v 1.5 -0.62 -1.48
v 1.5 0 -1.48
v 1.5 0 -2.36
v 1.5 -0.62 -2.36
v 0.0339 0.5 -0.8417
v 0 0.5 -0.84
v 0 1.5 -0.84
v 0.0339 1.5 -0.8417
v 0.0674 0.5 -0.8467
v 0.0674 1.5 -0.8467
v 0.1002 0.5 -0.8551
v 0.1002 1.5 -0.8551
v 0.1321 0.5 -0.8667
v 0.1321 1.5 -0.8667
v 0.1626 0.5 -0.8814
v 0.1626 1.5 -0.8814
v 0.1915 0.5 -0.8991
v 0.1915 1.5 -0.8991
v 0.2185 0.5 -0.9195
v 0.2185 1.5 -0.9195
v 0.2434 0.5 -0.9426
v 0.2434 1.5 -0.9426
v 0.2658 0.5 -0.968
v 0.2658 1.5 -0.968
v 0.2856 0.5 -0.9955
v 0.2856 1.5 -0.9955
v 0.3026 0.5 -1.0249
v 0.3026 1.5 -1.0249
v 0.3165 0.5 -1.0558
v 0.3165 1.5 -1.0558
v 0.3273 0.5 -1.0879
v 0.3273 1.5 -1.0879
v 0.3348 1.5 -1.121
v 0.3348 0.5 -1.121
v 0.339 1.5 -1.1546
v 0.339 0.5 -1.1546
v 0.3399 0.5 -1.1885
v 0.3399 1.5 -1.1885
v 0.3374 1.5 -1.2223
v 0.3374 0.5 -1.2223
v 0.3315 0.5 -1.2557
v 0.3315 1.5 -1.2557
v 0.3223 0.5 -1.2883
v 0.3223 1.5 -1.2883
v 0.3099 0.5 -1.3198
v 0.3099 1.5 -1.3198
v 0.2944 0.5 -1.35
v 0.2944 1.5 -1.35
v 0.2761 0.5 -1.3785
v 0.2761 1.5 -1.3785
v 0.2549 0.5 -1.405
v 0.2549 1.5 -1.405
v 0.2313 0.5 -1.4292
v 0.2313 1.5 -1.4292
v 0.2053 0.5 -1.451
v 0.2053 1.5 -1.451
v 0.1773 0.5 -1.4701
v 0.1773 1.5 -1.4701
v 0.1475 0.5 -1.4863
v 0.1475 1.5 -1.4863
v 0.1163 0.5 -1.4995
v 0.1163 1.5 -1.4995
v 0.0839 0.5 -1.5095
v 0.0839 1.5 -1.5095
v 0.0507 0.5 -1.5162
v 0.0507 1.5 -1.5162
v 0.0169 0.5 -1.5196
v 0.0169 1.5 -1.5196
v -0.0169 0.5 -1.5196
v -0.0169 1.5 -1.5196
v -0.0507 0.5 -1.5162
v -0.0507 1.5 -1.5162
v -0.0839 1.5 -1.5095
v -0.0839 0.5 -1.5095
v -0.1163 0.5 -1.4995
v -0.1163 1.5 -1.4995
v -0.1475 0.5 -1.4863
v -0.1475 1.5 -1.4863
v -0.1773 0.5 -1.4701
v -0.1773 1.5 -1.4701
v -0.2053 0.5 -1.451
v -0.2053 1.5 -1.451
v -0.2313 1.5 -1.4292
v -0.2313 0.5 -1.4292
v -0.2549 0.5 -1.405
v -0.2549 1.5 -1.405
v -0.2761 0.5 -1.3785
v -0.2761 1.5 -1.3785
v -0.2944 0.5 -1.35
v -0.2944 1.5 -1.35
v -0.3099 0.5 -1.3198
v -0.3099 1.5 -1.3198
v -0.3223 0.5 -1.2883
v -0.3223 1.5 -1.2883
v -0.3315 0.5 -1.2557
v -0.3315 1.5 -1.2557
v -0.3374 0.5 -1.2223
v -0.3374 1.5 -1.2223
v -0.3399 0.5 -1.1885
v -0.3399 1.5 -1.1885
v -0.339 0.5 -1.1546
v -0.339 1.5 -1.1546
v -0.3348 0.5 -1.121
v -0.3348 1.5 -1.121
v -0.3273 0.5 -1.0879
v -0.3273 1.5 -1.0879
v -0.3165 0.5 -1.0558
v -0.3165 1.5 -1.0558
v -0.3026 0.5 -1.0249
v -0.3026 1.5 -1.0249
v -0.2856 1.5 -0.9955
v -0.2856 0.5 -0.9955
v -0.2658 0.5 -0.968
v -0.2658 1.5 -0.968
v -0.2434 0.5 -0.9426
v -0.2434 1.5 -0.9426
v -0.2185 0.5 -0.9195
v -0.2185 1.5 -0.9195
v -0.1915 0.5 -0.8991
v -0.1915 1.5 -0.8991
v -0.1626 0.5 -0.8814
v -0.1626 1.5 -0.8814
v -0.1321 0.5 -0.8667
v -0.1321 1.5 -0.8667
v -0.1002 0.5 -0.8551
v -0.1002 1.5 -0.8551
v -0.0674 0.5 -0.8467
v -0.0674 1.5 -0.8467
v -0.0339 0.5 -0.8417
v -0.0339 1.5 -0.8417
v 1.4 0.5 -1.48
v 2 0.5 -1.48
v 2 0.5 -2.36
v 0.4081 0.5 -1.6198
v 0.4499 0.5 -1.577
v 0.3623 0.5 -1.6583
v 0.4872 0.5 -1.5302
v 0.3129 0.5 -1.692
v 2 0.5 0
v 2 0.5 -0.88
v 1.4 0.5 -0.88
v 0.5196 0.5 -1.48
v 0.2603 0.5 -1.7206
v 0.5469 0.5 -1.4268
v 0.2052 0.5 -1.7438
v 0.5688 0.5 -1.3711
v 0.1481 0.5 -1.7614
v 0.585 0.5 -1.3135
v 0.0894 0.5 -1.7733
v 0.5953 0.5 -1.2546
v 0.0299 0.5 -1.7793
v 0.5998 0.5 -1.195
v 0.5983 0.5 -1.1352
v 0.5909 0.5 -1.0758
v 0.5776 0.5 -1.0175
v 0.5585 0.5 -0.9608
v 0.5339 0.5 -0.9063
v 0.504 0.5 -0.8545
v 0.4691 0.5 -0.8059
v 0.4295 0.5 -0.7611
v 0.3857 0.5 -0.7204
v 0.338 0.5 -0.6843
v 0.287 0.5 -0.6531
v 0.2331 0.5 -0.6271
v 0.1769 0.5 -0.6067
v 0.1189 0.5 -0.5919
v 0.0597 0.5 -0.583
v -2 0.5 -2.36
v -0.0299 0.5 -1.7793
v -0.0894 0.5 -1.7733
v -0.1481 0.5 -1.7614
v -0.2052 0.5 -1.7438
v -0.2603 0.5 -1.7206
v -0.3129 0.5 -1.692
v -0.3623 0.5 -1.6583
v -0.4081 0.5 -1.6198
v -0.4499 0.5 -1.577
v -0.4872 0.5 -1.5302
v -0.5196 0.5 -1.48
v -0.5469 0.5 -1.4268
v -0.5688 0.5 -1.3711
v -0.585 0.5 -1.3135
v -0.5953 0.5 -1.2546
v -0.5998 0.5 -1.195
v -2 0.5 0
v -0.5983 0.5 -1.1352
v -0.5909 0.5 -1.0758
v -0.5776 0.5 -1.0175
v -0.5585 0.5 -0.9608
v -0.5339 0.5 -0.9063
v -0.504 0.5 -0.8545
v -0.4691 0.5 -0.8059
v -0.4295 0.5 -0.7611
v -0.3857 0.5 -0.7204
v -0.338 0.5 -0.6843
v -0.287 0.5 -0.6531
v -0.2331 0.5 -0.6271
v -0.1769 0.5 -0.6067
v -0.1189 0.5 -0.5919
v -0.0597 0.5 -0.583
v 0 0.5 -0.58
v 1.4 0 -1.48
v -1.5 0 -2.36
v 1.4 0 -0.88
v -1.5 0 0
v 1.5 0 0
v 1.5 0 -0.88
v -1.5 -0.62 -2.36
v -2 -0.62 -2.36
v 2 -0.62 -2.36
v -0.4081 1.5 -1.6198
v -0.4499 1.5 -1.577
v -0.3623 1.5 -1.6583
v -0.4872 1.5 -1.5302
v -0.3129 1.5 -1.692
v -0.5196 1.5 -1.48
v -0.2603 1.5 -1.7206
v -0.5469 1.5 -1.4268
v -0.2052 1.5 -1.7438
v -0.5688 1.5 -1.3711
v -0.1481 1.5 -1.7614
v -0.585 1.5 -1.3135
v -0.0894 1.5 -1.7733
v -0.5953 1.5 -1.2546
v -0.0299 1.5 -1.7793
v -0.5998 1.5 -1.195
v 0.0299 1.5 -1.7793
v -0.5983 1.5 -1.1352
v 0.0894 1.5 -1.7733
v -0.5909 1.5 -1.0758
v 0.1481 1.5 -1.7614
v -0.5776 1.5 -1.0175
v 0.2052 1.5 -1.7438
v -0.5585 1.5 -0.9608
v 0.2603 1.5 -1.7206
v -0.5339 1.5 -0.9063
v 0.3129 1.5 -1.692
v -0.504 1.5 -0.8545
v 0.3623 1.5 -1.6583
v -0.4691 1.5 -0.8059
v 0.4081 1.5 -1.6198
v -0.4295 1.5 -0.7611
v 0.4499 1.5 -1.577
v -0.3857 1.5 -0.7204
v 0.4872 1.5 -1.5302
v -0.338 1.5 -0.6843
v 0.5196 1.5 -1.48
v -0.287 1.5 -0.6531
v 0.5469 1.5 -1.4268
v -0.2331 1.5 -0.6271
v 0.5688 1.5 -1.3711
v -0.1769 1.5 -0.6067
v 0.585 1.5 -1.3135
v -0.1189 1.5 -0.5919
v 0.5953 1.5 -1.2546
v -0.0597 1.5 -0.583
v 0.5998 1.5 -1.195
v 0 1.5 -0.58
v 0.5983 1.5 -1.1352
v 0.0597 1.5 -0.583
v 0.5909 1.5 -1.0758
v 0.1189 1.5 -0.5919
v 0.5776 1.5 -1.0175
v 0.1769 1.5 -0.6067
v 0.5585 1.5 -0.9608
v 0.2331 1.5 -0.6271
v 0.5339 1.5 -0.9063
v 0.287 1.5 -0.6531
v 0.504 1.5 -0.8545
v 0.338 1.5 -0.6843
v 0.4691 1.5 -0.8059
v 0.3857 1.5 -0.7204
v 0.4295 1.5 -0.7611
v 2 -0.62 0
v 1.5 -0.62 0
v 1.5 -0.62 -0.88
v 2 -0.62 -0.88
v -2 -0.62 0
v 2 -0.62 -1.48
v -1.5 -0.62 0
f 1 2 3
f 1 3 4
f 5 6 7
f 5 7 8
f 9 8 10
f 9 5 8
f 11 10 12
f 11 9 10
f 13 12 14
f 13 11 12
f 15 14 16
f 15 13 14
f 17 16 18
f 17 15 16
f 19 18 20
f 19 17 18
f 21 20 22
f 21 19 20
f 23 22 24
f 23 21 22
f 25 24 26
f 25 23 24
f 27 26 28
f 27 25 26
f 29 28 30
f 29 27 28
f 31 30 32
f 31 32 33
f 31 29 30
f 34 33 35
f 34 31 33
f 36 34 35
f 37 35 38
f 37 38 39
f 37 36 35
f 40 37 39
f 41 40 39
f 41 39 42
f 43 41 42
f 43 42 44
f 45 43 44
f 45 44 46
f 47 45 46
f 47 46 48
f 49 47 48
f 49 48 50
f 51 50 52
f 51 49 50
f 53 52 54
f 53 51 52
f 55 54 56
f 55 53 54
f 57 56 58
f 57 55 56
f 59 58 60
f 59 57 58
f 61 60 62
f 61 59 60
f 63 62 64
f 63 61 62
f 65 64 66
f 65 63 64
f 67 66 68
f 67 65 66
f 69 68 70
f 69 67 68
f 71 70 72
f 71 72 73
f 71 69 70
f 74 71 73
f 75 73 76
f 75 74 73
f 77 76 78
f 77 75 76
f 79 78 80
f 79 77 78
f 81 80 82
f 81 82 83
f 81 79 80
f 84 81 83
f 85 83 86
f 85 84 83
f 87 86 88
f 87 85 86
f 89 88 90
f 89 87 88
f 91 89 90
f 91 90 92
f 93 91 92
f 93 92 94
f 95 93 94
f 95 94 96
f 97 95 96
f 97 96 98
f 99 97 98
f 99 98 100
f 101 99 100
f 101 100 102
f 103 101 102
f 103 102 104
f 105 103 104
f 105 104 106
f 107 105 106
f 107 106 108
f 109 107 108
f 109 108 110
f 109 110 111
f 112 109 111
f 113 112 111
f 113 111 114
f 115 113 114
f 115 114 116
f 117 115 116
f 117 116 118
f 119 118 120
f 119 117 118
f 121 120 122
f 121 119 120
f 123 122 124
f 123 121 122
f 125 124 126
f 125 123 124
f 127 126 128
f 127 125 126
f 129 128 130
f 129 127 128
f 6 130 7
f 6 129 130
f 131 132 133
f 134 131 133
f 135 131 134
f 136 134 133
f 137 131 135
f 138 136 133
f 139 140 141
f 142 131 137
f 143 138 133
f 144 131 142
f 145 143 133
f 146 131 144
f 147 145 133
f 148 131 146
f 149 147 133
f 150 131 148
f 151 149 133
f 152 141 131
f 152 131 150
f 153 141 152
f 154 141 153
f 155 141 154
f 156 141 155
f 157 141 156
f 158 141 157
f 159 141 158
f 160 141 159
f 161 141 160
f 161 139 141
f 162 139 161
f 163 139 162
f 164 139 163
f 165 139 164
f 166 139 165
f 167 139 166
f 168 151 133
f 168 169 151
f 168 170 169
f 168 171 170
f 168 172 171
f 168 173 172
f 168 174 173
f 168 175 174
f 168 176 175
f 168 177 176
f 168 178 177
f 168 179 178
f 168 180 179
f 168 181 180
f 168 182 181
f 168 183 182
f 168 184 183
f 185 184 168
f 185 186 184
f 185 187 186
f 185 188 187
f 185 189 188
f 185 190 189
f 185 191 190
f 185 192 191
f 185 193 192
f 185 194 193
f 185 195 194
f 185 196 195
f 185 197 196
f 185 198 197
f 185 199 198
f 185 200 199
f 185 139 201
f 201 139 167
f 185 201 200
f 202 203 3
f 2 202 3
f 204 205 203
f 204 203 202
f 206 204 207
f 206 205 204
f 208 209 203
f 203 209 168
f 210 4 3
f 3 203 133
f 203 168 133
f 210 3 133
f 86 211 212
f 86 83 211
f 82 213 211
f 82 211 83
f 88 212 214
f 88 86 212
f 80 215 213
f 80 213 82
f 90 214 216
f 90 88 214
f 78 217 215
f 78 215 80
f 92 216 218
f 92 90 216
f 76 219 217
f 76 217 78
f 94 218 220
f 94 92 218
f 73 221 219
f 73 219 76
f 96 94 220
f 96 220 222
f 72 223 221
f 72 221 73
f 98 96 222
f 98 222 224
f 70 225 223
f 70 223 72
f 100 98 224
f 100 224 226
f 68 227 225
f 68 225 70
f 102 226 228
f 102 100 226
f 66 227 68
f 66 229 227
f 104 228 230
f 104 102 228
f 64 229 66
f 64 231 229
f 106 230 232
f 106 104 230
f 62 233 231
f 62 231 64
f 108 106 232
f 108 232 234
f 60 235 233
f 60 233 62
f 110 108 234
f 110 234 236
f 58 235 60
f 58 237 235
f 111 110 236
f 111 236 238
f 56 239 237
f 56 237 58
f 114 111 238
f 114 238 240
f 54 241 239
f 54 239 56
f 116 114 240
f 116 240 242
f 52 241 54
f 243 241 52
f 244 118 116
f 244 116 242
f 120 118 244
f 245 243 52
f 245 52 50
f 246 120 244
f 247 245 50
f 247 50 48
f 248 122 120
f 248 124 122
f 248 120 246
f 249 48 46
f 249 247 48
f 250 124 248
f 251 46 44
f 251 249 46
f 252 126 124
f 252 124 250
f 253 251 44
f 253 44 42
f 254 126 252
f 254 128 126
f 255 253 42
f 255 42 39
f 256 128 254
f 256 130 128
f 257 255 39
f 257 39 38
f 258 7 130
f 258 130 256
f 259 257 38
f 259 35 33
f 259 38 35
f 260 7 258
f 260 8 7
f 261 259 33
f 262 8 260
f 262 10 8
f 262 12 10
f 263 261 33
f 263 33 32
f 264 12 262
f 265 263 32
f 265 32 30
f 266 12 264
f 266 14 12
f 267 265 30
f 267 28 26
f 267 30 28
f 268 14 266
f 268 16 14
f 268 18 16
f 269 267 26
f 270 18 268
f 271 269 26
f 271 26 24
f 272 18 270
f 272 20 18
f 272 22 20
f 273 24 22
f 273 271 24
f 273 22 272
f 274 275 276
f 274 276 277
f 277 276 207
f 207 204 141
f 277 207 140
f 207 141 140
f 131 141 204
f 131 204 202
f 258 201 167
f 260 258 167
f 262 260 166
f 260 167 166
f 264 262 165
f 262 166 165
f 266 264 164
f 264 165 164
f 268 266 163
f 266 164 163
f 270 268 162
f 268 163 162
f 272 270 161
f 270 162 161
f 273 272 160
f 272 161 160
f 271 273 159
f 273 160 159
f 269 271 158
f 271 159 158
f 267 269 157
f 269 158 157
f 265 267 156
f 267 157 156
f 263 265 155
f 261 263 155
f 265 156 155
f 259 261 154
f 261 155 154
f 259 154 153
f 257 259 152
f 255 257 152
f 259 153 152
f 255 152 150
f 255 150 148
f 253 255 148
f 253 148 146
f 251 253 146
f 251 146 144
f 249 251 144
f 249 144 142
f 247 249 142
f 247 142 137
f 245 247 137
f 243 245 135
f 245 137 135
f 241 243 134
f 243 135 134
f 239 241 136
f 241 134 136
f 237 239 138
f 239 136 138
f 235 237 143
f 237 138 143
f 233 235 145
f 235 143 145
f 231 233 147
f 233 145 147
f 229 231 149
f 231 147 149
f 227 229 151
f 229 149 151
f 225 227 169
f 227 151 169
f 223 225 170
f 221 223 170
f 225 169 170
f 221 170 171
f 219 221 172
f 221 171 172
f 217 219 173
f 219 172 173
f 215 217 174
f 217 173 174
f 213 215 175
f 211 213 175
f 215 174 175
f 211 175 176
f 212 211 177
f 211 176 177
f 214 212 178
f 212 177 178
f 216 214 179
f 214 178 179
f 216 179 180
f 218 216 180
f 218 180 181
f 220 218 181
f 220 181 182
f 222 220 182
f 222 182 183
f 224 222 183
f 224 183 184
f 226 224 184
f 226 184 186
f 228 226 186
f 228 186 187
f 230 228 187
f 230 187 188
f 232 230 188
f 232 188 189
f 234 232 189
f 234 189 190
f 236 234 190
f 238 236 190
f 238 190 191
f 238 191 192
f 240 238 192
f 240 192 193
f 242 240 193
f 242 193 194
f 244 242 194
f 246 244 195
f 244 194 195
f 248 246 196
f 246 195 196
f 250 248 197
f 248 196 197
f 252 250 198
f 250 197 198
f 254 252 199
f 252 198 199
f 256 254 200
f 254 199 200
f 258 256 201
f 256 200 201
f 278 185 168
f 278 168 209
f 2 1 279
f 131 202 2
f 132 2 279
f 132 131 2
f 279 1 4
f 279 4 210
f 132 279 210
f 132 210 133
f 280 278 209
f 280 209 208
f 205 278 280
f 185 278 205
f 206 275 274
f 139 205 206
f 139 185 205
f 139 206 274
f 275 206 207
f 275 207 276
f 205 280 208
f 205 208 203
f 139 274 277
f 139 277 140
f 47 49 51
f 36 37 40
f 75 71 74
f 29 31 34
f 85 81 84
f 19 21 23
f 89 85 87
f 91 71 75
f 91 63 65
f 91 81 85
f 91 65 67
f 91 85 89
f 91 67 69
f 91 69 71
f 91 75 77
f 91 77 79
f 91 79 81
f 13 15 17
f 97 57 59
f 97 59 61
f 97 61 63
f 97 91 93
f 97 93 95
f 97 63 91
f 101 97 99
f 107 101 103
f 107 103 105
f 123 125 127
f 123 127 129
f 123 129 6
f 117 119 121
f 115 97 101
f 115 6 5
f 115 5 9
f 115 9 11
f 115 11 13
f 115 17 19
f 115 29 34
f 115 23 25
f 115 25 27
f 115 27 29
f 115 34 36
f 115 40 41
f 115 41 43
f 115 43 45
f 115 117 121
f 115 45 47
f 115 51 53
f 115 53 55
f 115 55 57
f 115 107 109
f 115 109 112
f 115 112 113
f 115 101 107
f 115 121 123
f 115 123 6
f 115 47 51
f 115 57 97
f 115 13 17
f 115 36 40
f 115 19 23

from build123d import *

# Parameters (mm, degrees)
SALIENTE_EXTRUIR1_DEPTH = 2.36
CROQUIS2_W              = 0.6
CROQUIS2_H              = 0.6
CORTAR_EXTRUIR2_DEPTH   = 4.289984802
CROQUIS3_R              = 0.6
CROQUIS3_R_2            = 0.34
SALIENTE_EXTRUIR2_DEPTH = 1


with BuildPart() as part:
    # Croquis1 → Saliente-Extruir1 (new body)
    with BuildSketch(Plane.XY):
        Polygon((1.5, -0.62), (2, -0.62), (2, 0.5), (-2, 0.5), (-2, -0.62), (-1.5, -0.62), (-1.5, 0), (1.5, 0), align=None)
    extrude(amount=-SALIENTE_EXTRUIR1_DEPTH)

    # Croquis2 → Cortar-Extruir2 (cut, through all)
    with BuildSketch(Plane(origin=(0, 0.5, 0), x_dir=(1, 0, 0), z_dir=(0, 1, 0))):
        with Locations((1.7, 1.18)):
            Rectangle(CROQUIS2_W, CROQUIS2_H)
    extrude(amount=-CORTAR_EXTRUIR2_DEPTH, mode=Mode.SUBTRACT)

    # Croquis3 → Saliente-Extruir2 (add)
    with BuildSketch(Plane(origin=(0, 0.5, 0), x_dir=(1, 0, 0), z_dir=(0, 1, 0))):
        with Locations(Location((0, 1.18, 0), (0, 0, 270))):
            Circle(CROQUIS3_R)
        with Locations(Location((0, 1.18, 0), (0, 0, 270))):
            Circle(CROQUIS3_R_2, mode=Mode.SUBTRACT)
    extrude(amount=SALIENTE_EXTRUIR2_DEPTH)


solid = part.part
